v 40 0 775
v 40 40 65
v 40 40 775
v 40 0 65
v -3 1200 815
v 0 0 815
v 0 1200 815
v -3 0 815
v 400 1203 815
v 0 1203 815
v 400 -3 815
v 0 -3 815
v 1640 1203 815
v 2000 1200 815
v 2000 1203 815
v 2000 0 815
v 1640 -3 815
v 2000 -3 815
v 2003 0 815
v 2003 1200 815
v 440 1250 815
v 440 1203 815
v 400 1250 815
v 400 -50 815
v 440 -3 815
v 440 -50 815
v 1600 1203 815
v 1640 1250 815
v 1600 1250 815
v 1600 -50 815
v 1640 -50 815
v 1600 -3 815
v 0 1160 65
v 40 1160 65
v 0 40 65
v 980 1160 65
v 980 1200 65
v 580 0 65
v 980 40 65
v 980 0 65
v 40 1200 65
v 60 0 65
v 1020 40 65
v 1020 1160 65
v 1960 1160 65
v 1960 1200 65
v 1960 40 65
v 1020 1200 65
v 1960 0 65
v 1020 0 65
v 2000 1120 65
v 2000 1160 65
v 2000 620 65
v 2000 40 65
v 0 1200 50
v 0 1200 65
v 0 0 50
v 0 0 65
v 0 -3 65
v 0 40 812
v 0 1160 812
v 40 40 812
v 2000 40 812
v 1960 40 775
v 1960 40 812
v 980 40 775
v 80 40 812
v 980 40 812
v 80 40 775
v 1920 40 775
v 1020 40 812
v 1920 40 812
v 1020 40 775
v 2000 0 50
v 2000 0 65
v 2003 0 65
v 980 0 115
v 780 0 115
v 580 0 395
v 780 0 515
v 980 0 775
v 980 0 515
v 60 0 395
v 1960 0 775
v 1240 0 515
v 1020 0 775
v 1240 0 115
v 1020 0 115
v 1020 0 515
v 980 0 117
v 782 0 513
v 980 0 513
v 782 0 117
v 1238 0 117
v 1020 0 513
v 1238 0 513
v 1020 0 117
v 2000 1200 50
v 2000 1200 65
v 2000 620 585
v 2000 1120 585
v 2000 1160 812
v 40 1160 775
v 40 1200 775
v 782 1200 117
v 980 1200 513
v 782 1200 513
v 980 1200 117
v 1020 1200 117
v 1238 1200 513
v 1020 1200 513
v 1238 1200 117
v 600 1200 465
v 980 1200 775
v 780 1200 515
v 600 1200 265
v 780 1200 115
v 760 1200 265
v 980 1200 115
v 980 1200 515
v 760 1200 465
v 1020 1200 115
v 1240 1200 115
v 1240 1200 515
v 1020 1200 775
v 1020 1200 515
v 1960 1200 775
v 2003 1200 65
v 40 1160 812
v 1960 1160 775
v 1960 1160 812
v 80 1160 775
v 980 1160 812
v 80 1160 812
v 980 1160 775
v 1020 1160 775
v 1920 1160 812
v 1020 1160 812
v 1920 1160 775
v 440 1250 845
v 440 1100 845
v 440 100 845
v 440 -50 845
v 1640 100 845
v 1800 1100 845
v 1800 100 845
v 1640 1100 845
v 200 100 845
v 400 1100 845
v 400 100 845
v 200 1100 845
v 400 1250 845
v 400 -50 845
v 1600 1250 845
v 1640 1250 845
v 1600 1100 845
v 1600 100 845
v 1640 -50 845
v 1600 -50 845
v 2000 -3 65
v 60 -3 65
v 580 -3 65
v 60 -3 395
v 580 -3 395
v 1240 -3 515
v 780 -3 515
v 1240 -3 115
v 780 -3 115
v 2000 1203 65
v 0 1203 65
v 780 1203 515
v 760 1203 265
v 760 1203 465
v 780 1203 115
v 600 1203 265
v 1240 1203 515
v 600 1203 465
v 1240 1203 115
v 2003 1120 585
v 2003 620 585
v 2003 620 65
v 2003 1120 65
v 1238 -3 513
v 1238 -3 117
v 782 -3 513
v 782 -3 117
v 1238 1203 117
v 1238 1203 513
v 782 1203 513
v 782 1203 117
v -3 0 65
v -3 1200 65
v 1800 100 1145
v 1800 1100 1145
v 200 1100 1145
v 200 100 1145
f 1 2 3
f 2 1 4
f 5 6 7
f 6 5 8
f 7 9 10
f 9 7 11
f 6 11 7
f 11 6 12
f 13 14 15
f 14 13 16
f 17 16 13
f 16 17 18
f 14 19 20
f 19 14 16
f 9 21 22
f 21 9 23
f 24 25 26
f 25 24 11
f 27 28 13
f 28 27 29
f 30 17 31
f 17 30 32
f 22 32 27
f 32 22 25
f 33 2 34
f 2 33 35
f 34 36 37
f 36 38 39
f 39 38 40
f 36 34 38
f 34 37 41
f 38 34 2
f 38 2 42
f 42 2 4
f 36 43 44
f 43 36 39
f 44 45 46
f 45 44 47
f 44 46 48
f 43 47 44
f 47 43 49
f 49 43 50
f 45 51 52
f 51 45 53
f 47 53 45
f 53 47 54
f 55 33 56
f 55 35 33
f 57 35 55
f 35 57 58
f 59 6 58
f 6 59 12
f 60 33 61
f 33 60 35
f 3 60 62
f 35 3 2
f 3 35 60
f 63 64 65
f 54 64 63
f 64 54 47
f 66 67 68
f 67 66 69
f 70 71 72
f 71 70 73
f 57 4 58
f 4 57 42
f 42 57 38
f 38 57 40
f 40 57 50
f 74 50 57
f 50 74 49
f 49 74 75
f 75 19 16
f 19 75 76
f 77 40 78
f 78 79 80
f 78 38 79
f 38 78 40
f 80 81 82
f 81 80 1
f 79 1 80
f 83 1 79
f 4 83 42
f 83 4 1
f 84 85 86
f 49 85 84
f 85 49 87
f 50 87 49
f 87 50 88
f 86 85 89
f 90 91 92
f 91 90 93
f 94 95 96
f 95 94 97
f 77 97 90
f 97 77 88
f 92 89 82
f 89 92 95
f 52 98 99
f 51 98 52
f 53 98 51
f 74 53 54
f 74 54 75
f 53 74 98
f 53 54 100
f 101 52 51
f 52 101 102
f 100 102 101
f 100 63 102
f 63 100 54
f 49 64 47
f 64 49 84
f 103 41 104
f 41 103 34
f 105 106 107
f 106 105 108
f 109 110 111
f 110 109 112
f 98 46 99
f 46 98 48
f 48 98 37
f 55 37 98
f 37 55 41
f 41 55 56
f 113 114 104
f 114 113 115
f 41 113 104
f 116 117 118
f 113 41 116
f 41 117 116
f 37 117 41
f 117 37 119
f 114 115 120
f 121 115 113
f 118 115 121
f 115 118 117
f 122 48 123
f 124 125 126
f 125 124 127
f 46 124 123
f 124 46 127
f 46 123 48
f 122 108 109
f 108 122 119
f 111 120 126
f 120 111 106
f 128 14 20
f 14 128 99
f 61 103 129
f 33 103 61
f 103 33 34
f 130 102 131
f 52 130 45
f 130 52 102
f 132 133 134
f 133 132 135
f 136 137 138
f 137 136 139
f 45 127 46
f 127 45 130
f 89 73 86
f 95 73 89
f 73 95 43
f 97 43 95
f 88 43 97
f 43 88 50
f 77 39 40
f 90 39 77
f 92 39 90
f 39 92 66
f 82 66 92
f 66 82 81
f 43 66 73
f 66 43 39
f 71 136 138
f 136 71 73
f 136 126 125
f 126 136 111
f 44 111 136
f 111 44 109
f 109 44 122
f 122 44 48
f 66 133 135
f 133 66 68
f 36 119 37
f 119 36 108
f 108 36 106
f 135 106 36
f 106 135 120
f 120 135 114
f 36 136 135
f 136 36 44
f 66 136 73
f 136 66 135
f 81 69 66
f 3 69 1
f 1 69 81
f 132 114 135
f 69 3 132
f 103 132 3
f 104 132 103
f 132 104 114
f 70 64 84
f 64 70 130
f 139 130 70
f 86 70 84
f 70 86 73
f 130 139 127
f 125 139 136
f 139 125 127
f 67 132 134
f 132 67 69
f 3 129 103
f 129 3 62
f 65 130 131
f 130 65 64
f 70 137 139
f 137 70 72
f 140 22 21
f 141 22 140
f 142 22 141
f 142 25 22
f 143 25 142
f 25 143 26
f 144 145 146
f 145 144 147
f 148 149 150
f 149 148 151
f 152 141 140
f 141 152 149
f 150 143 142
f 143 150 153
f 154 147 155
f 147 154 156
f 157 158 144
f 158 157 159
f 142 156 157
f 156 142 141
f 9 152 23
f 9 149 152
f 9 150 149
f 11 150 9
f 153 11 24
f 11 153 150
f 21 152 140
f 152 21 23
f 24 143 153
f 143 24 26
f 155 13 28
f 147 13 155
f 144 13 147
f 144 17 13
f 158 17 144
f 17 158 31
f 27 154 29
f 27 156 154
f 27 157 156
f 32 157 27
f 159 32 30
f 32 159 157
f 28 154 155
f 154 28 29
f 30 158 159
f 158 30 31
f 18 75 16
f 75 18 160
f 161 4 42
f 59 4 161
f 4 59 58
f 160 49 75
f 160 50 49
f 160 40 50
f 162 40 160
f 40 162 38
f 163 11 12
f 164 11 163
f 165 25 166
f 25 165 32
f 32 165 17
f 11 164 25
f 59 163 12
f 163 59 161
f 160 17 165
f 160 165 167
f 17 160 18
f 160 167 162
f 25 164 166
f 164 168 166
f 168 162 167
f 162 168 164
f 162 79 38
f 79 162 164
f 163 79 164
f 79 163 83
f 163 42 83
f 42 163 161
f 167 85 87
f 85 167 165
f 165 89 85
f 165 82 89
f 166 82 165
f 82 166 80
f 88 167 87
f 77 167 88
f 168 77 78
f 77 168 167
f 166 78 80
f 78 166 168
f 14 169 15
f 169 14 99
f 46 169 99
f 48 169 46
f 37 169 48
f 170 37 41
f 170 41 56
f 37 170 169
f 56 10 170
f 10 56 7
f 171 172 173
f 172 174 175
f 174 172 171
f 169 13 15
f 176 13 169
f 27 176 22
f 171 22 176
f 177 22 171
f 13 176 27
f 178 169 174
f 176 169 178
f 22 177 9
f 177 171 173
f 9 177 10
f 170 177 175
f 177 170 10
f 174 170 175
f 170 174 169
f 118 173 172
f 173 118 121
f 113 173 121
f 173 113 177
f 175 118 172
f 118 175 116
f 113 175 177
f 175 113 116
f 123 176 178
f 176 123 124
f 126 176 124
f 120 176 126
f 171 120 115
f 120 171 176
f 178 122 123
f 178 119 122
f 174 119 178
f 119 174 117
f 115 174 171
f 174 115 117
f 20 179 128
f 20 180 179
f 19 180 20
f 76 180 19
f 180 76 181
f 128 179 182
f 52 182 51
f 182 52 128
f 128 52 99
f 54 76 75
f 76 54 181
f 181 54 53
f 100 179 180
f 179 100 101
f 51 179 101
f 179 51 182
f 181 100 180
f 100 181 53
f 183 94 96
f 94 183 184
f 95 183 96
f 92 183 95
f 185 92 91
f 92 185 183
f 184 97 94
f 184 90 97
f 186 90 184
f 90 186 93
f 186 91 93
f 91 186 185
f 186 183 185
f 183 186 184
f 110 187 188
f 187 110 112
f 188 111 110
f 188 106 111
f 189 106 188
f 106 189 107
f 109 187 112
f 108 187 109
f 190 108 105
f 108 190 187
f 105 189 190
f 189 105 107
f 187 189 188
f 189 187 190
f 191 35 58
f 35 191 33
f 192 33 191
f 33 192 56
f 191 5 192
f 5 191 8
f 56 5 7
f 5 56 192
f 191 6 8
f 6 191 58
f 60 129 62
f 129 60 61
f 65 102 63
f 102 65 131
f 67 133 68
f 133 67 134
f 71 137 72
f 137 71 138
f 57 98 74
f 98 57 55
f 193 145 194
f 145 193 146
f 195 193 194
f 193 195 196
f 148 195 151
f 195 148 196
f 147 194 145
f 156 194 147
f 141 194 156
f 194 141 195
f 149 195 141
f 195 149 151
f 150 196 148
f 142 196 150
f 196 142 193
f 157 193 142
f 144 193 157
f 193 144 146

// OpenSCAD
// cad/cabin.scad
/*
 * Offroad Adventure Trailer - Expedition Canopy (for a roof tent)
 *
 * A solid box structure (canopy) built from an inner skeleton and clad
 * with aluminum/plywood sheets on the sides, floor and roof.
 * Designed with roof racks to carry a roof tent level with the car.
 */

frame_length = 2000;
frame_width = 1200; // Matches frame.scad (narrowed for the Ranger's track)
cabin_height = 750; // Low profile so the roof tent lands at a good height
pillar_w = 40;      // 40x40 mm square tube for the body skeleton
floor_t = 15;       // Form plywood floor
wall_t = 3;         // Dibond / aluminum / plywood walls

module canopy_skeleton() {
    color("silver") {
        // Corner pillars (vertical)
        translate([0, 0, 0]) cube([pillar_w, pillar_w, cabin_height]);
        translate([frame_length - pillar_w, 0, 0]) cube([pillar_w, pillar_w, cabin_height]);
        translate([0, frame_width - pillar_w, 0]) cube([pillar_w, pillar_w, cabin_height]);
        translate([frame_length - pillar_w, frame_width - pillar_w, 0]) cube([pillar_w, pillar_w, cabin_height]);

        // Mid pillars (prevent sag when sleeping in the tent)
        translate([frame_length/2 - pillar_w/2, 0, 0]) cube([pillar_w, pillar_w, cabin_height]);
        translate([frame_length/2 - pillar_w/2, frame_width - pillar_w, 0]) cube([pillar_w, pillar_w, cabin_height]);

        // Roof beams (long sides)
        translate([0, 0, cabin_height - pillar_w]) cube([frame_length, pillar_w, pillar_w]);
        translate([0, frame_width - pillar_w, cabin_height - pillar_w]) cube([frame_length, pillar_w, pillar_w]);

        // Roof beams (short sides and middle)
        translate([pillar_w, 0, cabin_height - pillar_w]) cube([pillar_w, frame_width, pillar_w]);
        translate([frame_length/2 - pillar_w/2, 0, cabin_height - pillar_w]) cube([pillar_w, frame_width, pillar_w]);
        translate([frame_length - 2*pillar_w, 0, cabin_height - pillar_w]) cube([pillar_w, frame_width, pillar_w]);
    }
}

module roof_racks() {
    // Transverse crossbars mounted on the roof
    color("black") {
        // Front bar
        translate([frame_length*0.2, -50, cabin_height]) cube([40, frame_width + 100, 30]);
        // Rear bar
        translate([frame_length*0.8, -50, cabin_height]) cube([40, frame_width + 100, 30]);
    }
}

module trailer_cabin() {
    // 1. Floor (15 mm form plywood or similar)
    color("SaddleBrown")
        translate([0, 0, 50]) cube([frame_length, frame_width, floor_t]);

    // 2. Skeleton (40x40 beams)
    translate([0, 0, 50 + floor_t])
        canopy_skeleton();

    // 3. Roof racks (the tent mounts to these)
    translate([0, 0, 50 + floor_t])
        roof_racks();

    // 4. Walls and roof sheets (semi-transparent to show the skeleton)
    color("WhiteSmoke", 0.8) {
        // Left wall (kitchen drawer opening + storage cabinet door)
        difference() {
            translate([0, -wall_t, 50 + floor_t]) cube([frame_length, wall_t, cabin_height]);
            // Opening for the kitchen drawer (front left, pulls out sideways)
            translate([60, -wall_t - 1, 50 + floor_t]) cube([520, wall_t + 2, 330]);
            // Opening for the storage cabinet door (behind the kitchen drawer)
            translate([780, -wall_t - 1, 50 + floor_t + 50]) cube([460, wall_t + 2, 400]);
        }
        // Storage cabinet door (hinged at the front edge, shown closed)
        color("Gainsboro")
            translate([782, -wall_t, 50 + floor_t + 52]) cube([456, wall_t, 396]);

        // Right wall (el-niche + electrical bay door - all electrical
        // lives on the right side, ahead of the fridge drawer)
        difference() {
            translate([0, frame_width, 50 + floor_t]) cube([frame_length, wall_t, cabin_height]);
            // Cutout for the electrical niche (Y matches main_assembly placement)
            translate([600, frame_width - 1, 50 + floor_t + 200]) cube([160, wall_t + 2, 200]);
            // Opening for the electrical bay door (battery box lifts out here)
            translate([780, frame_width - 1, 50 + floor_t + 50]) cube([460, wall_t + 2, 400]);
        }
        // Electrical bay door (shown closed)
        color("Gainsboro")
            translate([782, frame_width, 50 + floor_t + 52]) cube([456, wall_t, 396]);

        // Front wall
        translate([-wall_t, 0, 50 + floor_t]) cube([wall_t, frame_width, cabin_height]);

        // Rear wall: SOLID except a fridge-sized hatch on the rear RIGHT
        // (the fridge drawer at y 640-1090 slides out through it,
        // sill-free at the floor). The rear left is closed.
        difference() {
            translate([frame_length, 0, 50 + floor_t]) cube([wall_t, frame_width, cabin_height]);
            // Fridge hatch: 500 wide x 520 tall, clears tray + fridge lid
            translate([frame_length - 1, 620, 50 + floor_t]) cube([wall_t + 2, 500, 520]);
        }

        // Roof
        translate([0, 0, 50 + floor_t + cabin_height - wall_t]) cube([frame_length, frame_width, wall_t]);
    }

    // 5. Visual roof tent (mockup, closed/folded state)
    color("DarkOliveGreen", 0.95)
    translate([frame_length*0.1, 100, 50 + floor_t + cabin_height + 30])
        cube([frame_length*0.8, frame_width - 200, 300]);
}

// Renders if the file is opened standalone
trailer_cabin();
